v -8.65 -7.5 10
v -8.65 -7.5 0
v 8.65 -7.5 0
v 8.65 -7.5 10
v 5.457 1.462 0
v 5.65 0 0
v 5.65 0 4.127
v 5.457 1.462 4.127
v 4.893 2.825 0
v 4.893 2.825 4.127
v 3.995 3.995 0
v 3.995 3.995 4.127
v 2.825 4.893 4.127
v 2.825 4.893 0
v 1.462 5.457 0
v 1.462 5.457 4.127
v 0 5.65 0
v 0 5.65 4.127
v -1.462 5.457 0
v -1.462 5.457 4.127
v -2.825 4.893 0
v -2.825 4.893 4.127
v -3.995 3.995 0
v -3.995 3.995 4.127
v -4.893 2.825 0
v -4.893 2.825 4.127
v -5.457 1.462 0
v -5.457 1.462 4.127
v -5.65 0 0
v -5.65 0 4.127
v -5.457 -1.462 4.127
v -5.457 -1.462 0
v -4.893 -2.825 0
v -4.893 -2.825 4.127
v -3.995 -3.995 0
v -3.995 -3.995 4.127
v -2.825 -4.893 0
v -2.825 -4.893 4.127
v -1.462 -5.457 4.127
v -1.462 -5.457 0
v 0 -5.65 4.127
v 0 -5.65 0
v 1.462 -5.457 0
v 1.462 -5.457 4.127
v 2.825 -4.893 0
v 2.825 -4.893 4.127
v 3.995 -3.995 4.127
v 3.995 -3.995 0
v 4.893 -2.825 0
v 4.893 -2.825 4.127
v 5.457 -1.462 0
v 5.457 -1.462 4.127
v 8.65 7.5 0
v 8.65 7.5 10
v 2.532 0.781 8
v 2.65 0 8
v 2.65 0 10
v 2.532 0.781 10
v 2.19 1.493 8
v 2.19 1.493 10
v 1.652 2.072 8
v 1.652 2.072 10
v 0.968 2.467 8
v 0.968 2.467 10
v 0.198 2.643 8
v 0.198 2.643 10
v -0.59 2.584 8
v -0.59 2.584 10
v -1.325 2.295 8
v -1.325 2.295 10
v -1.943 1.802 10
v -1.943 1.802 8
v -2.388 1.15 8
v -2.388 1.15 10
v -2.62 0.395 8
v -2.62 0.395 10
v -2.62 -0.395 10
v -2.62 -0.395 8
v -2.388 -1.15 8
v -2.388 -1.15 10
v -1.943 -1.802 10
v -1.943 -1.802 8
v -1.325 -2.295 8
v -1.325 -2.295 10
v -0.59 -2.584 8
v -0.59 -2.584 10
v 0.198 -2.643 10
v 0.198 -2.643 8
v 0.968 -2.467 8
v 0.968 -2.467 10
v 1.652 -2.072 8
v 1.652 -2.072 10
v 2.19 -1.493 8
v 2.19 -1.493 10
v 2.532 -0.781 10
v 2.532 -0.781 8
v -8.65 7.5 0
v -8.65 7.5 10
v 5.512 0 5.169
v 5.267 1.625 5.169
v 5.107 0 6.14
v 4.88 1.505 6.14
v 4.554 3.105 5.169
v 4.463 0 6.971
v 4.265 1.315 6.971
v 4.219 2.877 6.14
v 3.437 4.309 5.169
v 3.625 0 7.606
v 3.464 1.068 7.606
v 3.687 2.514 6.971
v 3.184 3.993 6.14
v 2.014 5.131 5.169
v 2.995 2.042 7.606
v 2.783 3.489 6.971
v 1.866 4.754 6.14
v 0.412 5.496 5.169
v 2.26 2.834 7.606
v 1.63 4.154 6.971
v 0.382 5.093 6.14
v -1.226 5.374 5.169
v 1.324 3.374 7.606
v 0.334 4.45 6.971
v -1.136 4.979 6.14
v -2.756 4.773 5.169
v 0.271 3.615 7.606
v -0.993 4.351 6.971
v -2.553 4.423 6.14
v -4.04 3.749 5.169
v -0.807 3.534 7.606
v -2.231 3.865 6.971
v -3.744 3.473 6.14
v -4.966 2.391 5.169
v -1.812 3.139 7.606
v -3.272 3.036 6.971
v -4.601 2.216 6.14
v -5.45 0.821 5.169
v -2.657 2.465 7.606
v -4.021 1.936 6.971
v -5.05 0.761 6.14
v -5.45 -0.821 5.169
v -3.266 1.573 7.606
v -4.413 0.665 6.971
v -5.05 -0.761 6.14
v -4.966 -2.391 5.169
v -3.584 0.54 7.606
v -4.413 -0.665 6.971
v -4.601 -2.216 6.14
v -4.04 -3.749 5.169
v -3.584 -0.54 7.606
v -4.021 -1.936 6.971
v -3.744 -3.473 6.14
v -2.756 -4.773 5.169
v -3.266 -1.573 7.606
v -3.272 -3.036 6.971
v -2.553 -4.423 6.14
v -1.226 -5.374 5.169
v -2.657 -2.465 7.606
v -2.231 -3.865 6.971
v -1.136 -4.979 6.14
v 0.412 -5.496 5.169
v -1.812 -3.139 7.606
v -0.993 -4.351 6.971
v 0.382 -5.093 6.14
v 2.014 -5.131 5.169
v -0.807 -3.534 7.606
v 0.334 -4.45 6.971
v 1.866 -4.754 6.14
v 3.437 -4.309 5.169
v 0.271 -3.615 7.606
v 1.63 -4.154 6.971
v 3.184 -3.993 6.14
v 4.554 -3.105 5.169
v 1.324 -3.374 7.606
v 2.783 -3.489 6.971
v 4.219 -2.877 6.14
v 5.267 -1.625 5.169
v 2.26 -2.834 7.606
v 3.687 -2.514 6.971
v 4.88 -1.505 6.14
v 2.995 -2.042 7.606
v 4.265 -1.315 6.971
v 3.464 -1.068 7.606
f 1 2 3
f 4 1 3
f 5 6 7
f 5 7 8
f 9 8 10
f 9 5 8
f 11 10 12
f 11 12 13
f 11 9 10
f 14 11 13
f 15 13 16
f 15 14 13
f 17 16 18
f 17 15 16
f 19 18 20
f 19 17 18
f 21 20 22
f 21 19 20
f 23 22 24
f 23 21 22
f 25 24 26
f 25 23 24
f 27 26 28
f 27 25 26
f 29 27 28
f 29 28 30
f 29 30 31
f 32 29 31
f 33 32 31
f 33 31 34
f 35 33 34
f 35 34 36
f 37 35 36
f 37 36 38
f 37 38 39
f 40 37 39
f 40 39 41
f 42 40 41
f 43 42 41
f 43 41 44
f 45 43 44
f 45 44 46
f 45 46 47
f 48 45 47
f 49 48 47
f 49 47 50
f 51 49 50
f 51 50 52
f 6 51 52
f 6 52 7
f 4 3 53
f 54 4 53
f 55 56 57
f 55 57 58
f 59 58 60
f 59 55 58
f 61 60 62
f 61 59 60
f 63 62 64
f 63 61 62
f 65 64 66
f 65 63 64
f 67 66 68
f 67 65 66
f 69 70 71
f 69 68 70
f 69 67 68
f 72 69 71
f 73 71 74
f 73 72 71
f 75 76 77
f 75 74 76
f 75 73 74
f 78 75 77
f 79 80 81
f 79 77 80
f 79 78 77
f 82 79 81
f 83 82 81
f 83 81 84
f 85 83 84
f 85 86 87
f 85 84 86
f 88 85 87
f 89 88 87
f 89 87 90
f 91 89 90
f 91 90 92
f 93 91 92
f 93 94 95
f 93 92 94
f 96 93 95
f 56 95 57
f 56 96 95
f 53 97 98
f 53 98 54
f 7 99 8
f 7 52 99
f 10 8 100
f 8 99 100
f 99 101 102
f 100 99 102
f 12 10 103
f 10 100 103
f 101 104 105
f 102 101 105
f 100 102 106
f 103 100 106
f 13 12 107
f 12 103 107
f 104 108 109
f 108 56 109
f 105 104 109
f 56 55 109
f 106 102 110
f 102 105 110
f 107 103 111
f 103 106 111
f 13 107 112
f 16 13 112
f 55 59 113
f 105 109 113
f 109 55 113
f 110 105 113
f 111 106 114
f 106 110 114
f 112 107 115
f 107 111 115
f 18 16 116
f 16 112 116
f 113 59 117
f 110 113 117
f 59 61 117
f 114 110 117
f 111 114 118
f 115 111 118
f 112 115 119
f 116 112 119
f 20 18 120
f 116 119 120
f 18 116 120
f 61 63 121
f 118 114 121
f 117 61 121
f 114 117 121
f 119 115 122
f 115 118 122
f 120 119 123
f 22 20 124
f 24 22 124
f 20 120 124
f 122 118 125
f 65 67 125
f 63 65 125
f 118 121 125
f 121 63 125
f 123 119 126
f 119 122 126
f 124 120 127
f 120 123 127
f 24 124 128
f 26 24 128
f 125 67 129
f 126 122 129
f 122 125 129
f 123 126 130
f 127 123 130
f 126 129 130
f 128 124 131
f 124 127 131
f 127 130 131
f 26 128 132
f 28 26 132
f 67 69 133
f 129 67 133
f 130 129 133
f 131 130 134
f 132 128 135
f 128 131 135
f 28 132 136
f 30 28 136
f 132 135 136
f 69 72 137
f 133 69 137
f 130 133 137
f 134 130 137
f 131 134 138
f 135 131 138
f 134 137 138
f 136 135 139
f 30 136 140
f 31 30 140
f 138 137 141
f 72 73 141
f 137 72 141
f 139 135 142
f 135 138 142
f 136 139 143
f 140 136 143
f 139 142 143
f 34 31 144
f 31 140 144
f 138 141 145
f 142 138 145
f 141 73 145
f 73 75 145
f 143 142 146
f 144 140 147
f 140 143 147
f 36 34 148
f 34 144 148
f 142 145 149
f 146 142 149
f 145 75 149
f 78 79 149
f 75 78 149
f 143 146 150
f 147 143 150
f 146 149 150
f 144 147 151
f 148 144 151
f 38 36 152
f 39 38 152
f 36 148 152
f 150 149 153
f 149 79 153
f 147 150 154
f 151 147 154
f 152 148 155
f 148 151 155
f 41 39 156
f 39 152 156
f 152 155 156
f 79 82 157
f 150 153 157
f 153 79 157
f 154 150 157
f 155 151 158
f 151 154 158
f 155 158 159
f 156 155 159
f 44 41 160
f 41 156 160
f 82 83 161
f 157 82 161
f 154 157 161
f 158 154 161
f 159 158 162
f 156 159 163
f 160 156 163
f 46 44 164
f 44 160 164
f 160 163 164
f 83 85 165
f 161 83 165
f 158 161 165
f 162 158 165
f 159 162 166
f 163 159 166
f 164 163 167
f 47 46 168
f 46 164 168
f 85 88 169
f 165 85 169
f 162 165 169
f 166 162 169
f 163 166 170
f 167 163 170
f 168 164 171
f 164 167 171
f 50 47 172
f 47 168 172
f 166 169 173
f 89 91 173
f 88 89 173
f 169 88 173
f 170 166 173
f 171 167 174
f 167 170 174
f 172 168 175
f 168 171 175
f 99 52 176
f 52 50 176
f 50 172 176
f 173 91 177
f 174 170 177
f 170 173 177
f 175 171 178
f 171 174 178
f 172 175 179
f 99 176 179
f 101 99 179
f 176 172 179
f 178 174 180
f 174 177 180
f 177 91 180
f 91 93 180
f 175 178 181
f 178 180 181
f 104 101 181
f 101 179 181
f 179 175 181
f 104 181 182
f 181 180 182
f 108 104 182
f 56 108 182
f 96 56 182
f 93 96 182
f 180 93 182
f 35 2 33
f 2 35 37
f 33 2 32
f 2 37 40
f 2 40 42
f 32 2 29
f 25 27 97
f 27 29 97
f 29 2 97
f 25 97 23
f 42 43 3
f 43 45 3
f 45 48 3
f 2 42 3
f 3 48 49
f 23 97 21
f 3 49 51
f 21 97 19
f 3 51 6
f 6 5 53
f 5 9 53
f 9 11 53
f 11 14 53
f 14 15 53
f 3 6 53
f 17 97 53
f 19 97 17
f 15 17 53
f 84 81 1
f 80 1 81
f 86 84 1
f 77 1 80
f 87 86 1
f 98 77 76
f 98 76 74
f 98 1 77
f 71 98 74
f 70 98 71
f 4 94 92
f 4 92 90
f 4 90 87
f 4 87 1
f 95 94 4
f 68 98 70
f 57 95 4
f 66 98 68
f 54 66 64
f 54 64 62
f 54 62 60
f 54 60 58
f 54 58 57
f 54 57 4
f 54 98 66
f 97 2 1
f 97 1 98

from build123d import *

# Parameters (mm, degrees)
F0_W     = 17.3
F0_H     = 15
F0_R     = 5.65
F1_DEPTH = 10
F2_DEPTH = 8
F3_R     = 2.65
F4_DEPTH = 16.1


# Not quite as in the source:
# - a fillet or chamfer that OpenCascade refuses, or shapes differently, is made with other operations: its cross-section is extruded or revolved along the edge and cut away or added


with BuildPart() as f1:
    # F0 (on Top) → F1 (new body)
    with BuildSketch(Plane.XY):
        Rectangle(F0_W, F0_H)
        Circle(F0_R, mode=Mode.SUBTRACT)
        Circle(F0_R)
    extrude(amount=F1_DEPTH)

    # F0 (on Top) → F2 (cut)
    with BuildSketch(Plane.XY):
        Circle(F0_R)
    extrude(amount=F2_DEPTH, mode=Mode.SUBTRACT)

    # F3 (on face) → F4 (cut)
    with BuildSketch(Plane.XY):
        Circle(F3_R)
    extrude(amount=F4_DEPTH, mode=Mode.SUBTRACT)

    # F5: fillet of radius 4 on 1 edges, made by hand

    # F5_s1 → F5_t2 (revolve)
    with BuildSketch(Plane.XZ):
        with BuildLine():
            ThreePointArc((5.65, 4.1270166538), (4.8122776602, 6.5765063966), (2.65, 8))
            Line((2.65, 8), (5.65, 8))
            Line((5.65, 8), (5.65, 4.1270166538))
        make_face()
    revolve(axis=Axis((0, 0, 8), (0, 0, 1)))


solid = f1.part
